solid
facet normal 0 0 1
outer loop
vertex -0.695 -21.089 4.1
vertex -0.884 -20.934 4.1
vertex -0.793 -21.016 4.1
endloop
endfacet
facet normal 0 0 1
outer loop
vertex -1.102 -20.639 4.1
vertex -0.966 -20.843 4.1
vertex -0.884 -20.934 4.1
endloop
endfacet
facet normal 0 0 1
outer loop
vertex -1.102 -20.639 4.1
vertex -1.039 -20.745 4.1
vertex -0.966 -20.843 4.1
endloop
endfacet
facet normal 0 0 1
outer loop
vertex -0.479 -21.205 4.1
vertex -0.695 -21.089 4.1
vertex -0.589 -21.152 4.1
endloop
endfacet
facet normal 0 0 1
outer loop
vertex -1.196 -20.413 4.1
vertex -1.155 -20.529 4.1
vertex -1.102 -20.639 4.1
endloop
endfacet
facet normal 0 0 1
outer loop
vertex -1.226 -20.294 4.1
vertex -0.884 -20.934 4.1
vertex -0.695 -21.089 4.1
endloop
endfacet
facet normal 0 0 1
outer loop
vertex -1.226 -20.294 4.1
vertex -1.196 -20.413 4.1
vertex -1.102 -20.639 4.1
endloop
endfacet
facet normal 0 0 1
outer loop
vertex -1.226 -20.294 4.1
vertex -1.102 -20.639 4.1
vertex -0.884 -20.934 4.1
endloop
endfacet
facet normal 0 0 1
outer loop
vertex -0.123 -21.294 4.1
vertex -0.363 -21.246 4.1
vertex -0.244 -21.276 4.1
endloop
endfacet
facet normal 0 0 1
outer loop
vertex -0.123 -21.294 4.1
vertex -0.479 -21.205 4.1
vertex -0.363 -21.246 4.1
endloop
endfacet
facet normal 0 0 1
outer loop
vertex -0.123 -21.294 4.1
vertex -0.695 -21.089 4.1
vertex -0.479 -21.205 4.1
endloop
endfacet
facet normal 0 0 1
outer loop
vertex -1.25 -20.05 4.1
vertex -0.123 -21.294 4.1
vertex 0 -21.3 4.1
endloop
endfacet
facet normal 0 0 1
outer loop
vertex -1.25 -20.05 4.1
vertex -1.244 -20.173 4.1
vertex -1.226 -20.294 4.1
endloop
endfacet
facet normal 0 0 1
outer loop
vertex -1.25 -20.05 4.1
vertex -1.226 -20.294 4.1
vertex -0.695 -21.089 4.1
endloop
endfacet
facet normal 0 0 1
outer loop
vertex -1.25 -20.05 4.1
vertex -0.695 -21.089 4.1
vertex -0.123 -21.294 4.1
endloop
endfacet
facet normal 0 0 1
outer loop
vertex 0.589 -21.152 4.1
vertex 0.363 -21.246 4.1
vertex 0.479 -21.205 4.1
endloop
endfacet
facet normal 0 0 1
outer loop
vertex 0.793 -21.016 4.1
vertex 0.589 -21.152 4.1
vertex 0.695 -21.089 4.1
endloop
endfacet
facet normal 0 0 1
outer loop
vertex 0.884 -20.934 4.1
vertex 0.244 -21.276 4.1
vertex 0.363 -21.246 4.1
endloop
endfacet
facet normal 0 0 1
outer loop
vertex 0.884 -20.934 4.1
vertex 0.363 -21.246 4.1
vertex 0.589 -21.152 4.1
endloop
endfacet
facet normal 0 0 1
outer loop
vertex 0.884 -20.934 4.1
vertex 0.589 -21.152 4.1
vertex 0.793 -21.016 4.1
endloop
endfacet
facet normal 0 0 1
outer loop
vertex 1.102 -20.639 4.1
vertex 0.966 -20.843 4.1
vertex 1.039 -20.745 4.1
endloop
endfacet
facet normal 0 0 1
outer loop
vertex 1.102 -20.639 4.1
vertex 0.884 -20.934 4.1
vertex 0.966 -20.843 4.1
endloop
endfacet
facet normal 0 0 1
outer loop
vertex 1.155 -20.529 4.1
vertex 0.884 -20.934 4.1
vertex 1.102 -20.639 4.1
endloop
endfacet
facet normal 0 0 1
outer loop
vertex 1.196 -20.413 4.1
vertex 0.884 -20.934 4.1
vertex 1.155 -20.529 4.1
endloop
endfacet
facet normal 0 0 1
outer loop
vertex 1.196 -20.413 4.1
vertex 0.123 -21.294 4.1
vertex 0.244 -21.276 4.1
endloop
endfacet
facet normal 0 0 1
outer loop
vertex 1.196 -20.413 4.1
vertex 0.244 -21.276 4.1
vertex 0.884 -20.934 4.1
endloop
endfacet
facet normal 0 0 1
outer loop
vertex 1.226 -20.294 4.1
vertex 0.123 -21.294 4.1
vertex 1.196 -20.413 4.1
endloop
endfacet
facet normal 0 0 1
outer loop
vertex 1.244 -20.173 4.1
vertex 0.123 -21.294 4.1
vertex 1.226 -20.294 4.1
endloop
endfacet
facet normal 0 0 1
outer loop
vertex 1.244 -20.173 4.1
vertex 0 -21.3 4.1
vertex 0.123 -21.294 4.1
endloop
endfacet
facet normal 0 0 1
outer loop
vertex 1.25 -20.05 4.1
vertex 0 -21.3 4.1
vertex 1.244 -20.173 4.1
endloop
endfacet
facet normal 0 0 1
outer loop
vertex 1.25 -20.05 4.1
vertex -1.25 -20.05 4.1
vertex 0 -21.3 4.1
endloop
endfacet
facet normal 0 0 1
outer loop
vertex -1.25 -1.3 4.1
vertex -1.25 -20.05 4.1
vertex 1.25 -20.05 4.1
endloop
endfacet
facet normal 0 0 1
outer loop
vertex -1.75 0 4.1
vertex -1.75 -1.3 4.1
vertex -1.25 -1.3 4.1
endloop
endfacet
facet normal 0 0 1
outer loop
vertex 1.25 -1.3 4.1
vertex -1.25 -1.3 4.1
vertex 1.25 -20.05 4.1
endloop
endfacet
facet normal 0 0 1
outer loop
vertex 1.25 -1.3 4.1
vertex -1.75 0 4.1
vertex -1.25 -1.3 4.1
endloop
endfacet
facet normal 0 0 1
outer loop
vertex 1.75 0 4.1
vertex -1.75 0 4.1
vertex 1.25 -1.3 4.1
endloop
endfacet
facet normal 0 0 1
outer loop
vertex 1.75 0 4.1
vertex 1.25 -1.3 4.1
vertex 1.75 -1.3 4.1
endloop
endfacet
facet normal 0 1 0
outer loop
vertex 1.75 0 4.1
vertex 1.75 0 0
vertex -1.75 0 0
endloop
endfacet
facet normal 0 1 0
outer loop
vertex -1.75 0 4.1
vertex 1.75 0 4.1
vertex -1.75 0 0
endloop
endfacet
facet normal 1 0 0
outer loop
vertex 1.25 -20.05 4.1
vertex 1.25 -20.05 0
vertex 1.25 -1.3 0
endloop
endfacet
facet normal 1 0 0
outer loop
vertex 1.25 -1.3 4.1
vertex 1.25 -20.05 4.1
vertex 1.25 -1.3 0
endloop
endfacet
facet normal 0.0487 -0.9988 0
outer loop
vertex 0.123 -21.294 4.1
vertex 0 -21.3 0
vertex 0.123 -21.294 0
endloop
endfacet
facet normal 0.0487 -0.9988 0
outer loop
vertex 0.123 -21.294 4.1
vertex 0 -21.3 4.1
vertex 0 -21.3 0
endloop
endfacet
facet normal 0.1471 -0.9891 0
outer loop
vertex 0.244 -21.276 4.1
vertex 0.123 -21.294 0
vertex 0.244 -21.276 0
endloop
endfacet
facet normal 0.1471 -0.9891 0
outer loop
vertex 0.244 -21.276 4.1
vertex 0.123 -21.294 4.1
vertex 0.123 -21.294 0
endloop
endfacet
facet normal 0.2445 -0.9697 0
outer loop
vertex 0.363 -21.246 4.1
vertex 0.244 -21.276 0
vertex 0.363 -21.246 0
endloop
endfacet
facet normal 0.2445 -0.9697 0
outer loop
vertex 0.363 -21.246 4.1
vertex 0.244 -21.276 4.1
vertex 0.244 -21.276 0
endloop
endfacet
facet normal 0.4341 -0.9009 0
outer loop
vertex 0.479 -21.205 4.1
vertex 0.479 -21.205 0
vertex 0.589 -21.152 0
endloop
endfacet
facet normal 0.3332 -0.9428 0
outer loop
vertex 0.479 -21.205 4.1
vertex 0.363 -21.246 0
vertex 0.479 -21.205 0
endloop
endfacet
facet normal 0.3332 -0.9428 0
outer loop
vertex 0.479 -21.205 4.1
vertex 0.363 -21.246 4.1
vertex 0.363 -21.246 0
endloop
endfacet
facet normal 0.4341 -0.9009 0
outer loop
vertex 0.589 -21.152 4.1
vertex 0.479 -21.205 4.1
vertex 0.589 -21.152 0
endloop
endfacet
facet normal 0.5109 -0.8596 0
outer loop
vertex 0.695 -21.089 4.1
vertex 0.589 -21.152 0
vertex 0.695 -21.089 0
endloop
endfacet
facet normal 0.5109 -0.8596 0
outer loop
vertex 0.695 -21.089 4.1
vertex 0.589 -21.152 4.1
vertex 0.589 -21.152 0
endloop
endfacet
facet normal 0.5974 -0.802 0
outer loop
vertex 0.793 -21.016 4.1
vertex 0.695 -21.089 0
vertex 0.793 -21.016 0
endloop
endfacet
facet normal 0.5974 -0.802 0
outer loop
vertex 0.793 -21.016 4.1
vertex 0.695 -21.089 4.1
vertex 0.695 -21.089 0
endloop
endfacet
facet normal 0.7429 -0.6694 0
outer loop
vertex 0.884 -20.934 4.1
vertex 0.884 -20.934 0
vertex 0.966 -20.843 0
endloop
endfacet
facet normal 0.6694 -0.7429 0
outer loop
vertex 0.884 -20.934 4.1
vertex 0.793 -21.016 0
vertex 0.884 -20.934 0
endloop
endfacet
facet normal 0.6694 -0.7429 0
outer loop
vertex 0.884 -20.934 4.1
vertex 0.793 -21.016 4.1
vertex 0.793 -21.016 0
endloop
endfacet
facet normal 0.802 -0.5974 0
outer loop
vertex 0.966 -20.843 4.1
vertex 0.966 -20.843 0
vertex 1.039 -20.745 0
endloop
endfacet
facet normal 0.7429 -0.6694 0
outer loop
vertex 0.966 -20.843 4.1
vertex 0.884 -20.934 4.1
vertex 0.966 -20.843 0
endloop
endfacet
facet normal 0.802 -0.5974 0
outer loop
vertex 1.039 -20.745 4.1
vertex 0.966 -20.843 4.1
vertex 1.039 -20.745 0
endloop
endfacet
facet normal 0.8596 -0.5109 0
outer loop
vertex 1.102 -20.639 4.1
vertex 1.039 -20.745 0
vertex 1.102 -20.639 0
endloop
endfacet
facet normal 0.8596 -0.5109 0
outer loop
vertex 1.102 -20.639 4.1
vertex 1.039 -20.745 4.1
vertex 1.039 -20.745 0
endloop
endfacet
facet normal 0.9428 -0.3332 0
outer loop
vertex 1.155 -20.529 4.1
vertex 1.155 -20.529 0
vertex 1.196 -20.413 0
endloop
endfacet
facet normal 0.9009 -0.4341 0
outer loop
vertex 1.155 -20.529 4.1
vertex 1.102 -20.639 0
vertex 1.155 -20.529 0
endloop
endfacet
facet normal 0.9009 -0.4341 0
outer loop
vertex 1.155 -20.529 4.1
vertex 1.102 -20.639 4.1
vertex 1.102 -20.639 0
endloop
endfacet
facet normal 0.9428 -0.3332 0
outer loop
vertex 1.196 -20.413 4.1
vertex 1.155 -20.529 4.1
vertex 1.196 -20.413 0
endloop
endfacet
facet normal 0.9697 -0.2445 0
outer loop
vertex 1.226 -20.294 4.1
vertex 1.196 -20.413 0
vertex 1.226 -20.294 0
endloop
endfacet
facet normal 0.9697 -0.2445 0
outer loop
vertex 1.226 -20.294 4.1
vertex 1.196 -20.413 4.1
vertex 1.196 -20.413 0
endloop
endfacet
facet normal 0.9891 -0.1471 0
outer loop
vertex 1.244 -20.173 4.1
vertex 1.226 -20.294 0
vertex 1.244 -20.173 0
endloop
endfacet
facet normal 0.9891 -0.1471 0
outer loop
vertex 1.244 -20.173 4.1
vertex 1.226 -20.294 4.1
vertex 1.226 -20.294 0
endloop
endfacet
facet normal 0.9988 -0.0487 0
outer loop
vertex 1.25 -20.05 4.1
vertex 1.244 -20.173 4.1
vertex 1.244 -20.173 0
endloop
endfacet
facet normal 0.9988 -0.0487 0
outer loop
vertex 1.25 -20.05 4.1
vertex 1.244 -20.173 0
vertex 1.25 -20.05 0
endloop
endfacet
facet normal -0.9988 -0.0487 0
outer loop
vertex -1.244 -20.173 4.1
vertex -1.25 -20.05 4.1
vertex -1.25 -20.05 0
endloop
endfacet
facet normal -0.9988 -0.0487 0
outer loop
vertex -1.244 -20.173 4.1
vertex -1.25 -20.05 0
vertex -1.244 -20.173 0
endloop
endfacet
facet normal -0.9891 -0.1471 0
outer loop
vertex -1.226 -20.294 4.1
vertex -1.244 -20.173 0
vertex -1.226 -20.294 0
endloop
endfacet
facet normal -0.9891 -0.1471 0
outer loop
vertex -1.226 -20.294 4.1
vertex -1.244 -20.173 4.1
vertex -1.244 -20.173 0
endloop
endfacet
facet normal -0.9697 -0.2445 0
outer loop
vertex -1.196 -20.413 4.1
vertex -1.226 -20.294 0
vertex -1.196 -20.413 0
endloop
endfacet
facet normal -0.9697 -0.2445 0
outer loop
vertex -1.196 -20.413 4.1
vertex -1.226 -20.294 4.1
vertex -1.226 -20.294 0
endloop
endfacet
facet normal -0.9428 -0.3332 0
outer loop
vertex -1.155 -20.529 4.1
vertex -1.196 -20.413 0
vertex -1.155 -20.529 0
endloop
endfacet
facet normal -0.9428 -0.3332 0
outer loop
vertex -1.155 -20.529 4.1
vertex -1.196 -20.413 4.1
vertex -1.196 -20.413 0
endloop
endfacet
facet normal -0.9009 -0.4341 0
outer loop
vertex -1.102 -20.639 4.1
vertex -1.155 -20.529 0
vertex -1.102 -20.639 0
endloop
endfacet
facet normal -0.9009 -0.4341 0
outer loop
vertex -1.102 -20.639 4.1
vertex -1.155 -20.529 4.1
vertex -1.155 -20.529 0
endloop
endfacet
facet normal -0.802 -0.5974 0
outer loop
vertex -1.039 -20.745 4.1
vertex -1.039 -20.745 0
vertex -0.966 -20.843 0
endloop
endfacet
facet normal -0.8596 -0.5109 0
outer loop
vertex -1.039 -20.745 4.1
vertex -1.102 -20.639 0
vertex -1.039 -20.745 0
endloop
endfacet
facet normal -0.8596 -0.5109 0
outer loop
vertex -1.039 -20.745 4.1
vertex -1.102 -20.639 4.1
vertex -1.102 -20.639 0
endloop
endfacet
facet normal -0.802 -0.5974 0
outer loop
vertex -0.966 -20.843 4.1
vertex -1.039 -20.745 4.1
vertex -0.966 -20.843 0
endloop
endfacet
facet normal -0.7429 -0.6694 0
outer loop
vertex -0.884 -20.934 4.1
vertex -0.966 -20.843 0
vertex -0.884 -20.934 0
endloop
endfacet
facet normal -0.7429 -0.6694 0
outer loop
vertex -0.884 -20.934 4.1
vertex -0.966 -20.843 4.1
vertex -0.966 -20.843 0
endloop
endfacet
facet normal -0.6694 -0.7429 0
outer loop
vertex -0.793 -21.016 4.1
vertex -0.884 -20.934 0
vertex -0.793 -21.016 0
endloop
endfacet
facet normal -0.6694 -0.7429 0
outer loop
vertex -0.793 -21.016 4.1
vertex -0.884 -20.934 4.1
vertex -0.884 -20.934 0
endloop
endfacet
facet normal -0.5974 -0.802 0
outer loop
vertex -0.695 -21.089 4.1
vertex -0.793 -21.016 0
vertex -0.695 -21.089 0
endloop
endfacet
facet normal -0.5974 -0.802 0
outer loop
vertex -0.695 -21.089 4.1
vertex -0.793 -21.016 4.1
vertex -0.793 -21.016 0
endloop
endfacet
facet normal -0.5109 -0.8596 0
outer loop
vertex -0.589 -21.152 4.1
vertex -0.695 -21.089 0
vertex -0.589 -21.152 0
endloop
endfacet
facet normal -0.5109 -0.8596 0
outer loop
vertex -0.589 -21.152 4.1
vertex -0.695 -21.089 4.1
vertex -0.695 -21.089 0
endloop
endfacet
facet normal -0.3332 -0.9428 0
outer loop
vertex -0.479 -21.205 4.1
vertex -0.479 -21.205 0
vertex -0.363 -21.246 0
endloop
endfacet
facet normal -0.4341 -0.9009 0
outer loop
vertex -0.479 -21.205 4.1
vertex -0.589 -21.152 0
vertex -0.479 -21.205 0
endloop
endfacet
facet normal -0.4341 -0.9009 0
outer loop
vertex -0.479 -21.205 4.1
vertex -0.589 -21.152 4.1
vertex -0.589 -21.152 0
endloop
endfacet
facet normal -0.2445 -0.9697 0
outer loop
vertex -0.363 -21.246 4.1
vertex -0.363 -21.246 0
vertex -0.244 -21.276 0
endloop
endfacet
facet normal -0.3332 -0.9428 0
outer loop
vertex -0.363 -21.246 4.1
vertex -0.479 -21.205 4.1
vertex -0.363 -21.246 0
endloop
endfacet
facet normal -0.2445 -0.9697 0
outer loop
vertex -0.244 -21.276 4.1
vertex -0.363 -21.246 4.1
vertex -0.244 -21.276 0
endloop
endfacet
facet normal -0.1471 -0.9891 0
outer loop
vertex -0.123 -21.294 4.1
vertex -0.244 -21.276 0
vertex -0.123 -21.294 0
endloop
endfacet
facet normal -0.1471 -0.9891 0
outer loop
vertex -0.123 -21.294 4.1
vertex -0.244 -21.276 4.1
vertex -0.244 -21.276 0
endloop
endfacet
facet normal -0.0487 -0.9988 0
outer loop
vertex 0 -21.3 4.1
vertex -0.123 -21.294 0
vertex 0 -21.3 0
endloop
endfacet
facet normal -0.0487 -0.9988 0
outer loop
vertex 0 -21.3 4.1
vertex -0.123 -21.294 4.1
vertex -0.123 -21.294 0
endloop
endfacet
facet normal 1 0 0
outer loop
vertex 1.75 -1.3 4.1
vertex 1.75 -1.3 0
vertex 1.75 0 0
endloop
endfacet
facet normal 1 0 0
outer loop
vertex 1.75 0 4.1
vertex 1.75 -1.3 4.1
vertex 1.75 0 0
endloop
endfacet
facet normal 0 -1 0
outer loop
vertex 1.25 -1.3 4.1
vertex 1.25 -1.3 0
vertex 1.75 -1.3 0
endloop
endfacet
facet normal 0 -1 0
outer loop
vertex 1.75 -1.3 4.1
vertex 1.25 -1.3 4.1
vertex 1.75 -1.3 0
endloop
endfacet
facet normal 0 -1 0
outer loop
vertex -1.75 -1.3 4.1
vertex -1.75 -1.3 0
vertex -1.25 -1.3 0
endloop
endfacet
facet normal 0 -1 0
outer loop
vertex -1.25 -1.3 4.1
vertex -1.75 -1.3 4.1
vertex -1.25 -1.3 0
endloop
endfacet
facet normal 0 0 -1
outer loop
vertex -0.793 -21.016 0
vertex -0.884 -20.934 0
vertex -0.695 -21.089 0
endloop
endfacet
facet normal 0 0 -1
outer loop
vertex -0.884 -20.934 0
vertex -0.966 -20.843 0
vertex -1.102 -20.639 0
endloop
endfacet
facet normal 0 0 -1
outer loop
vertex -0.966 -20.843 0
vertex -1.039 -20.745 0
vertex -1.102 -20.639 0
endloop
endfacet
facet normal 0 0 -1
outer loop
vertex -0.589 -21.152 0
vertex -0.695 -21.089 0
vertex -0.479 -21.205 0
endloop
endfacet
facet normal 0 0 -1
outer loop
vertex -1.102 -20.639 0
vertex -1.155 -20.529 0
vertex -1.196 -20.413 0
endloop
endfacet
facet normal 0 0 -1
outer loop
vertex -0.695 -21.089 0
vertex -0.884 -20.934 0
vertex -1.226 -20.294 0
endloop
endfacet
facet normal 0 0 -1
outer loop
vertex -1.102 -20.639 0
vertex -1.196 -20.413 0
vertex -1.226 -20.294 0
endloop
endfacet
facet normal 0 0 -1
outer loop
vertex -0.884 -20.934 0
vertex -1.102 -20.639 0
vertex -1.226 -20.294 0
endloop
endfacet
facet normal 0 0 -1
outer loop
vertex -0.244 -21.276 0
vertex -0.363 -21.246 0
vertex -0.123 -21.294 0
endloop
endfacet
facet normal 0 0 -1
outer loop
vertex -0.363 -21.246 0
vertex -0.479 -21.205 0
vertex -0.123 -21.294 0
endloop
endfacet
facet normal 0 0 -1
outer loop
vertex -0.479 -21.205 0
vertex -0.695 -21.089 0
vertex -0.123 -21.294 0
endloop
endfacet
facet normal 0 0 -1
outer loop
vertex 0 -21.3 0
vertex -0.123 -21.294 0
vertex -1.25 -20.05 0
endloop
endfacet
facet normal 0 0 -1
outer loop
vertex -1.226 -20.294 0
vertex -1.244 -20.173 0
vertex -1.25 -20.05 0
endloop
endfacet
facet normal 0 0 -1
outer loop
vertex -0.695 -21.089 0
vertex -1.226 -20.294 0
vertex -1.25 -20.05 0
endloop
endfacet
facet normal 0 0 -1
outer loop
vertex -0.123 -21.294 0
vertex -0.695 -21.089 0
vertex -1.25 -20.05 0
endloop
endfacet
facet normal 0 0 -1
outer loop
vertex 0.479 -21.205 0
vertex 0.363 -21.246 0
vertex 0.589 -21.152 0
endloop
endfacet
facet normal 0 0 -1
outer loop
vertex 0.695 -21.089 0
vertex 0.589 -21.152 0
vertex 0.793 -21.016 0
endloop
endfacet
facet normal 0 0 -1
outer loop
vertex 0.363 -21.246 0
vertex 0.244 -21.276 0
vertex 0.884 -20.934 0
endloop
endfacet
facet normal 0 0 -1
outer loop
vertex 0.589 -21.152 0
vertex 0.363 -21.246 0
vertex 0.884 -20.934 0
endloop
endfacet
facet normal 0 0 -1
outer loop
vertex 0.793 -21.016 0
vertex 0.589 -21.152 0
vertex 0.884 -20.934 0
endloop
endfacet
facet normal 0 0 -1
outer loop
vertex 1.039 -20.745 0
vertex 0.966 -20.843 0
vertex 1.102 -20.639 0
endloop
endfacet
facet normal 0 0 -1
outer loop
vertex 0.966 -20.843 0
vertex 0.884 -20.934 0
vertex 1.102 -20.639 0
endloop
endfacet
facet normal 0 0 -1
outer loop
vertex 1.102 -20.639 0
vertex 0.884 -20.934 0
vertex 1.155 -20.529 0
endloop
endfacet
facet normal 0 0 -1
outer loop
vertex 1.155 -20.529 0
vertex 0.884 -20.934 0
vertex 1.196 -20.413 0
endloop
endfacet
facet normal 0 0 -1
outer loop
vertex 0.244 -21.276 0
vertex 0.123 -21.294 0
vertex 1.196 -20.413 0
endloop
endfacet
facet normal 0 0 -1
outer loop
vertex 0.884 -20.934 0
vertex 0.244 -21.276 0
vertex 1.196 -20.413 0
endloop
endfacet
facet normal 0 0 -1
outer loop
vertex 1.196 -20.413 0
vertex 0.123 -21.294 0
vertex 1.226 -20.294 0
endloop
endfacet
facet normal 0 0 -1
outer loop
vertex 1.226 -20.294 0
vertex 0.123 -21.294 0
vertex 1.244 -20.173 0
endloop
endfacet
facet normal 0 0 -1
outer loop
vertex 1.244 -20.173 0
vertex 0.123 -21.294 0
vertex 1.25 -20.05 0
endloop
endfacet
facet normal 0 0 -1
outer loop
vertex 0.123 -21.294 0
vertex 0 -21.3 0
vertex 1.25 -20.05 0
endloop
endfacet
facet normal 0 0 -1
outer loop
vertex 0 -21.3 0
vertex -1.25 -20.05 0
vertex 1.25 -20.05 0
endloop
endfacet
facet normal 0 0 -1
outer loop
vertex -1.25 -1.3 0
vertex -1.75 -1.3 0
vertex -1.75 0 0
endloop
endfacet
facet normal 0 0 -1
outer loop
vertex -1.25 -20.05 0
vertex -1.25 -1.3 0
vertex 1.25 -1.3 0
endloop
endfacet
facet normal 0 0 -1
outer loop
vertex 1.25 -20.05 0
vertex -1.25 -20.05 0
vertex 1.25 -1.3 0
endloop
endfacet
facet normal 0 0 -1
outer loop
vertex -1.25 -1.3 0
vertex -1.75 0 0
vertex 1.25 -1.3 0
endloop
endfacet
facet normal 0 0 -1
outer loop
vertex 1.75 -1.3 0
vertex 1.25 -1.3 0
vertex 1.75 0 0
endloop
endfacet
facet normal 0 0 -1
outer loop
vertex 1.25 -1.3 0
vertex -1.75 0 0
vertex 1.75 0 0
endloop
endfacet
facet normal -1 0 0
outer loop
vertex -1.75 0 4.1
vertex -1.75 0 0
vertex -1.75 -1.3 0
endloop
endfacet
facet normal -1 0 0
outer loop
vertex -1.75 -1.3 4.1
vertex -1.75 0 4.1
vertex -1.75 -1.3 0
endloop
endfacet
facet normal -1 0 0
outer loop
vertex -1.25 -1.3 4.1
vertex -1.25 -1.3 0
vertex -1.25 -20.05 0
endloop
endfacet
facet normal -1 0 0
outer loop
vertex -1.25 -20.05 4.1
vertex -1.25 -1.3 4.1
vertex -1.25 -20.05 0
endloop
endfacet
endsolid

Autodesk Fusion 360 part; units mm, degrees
sketch "Sketch1" plane through (0, 0, 0) normal (0, 0, 1) x (1, 0, 0)
  line L0 (0, 0) -> (-1.75, 0)
  line L1 (-1.75, 0) -> (-1.75, -1.3)
  line L2 (-1.75, -1.3) -> (-1.25, -1.3)
  line L3 (-1.25, -1.3) -> (-1.25, -21.3)
  line L4 (-1.25, -21.3) -> (1.25, -21.3)
  line L5 (1.25, -21.3) -> (1.25, -1.3)
  line L6 (1.25, -1.3) -> (1.75, -1.3)
  line L7 (1.75, -1.3) -> (1.75, 0)
  line L8 (1.75, 0) -> (0, 0)
  line L9 (1.25, -1.3) -> (-1.25, -1.3) construction
  dimension "d1" = 3.5
  dimension "d2" = 1.3
  dimension "d3" = 20
  dimension "d4" = 2.5
extrude "Extrude1" add sketch "Sketch1" along normal blind 4.1
fillet "Fillet1" radius 1.25 2 edges at (1.25, -21.3, 2.05) (-1.25, -21.3, 2.05)
